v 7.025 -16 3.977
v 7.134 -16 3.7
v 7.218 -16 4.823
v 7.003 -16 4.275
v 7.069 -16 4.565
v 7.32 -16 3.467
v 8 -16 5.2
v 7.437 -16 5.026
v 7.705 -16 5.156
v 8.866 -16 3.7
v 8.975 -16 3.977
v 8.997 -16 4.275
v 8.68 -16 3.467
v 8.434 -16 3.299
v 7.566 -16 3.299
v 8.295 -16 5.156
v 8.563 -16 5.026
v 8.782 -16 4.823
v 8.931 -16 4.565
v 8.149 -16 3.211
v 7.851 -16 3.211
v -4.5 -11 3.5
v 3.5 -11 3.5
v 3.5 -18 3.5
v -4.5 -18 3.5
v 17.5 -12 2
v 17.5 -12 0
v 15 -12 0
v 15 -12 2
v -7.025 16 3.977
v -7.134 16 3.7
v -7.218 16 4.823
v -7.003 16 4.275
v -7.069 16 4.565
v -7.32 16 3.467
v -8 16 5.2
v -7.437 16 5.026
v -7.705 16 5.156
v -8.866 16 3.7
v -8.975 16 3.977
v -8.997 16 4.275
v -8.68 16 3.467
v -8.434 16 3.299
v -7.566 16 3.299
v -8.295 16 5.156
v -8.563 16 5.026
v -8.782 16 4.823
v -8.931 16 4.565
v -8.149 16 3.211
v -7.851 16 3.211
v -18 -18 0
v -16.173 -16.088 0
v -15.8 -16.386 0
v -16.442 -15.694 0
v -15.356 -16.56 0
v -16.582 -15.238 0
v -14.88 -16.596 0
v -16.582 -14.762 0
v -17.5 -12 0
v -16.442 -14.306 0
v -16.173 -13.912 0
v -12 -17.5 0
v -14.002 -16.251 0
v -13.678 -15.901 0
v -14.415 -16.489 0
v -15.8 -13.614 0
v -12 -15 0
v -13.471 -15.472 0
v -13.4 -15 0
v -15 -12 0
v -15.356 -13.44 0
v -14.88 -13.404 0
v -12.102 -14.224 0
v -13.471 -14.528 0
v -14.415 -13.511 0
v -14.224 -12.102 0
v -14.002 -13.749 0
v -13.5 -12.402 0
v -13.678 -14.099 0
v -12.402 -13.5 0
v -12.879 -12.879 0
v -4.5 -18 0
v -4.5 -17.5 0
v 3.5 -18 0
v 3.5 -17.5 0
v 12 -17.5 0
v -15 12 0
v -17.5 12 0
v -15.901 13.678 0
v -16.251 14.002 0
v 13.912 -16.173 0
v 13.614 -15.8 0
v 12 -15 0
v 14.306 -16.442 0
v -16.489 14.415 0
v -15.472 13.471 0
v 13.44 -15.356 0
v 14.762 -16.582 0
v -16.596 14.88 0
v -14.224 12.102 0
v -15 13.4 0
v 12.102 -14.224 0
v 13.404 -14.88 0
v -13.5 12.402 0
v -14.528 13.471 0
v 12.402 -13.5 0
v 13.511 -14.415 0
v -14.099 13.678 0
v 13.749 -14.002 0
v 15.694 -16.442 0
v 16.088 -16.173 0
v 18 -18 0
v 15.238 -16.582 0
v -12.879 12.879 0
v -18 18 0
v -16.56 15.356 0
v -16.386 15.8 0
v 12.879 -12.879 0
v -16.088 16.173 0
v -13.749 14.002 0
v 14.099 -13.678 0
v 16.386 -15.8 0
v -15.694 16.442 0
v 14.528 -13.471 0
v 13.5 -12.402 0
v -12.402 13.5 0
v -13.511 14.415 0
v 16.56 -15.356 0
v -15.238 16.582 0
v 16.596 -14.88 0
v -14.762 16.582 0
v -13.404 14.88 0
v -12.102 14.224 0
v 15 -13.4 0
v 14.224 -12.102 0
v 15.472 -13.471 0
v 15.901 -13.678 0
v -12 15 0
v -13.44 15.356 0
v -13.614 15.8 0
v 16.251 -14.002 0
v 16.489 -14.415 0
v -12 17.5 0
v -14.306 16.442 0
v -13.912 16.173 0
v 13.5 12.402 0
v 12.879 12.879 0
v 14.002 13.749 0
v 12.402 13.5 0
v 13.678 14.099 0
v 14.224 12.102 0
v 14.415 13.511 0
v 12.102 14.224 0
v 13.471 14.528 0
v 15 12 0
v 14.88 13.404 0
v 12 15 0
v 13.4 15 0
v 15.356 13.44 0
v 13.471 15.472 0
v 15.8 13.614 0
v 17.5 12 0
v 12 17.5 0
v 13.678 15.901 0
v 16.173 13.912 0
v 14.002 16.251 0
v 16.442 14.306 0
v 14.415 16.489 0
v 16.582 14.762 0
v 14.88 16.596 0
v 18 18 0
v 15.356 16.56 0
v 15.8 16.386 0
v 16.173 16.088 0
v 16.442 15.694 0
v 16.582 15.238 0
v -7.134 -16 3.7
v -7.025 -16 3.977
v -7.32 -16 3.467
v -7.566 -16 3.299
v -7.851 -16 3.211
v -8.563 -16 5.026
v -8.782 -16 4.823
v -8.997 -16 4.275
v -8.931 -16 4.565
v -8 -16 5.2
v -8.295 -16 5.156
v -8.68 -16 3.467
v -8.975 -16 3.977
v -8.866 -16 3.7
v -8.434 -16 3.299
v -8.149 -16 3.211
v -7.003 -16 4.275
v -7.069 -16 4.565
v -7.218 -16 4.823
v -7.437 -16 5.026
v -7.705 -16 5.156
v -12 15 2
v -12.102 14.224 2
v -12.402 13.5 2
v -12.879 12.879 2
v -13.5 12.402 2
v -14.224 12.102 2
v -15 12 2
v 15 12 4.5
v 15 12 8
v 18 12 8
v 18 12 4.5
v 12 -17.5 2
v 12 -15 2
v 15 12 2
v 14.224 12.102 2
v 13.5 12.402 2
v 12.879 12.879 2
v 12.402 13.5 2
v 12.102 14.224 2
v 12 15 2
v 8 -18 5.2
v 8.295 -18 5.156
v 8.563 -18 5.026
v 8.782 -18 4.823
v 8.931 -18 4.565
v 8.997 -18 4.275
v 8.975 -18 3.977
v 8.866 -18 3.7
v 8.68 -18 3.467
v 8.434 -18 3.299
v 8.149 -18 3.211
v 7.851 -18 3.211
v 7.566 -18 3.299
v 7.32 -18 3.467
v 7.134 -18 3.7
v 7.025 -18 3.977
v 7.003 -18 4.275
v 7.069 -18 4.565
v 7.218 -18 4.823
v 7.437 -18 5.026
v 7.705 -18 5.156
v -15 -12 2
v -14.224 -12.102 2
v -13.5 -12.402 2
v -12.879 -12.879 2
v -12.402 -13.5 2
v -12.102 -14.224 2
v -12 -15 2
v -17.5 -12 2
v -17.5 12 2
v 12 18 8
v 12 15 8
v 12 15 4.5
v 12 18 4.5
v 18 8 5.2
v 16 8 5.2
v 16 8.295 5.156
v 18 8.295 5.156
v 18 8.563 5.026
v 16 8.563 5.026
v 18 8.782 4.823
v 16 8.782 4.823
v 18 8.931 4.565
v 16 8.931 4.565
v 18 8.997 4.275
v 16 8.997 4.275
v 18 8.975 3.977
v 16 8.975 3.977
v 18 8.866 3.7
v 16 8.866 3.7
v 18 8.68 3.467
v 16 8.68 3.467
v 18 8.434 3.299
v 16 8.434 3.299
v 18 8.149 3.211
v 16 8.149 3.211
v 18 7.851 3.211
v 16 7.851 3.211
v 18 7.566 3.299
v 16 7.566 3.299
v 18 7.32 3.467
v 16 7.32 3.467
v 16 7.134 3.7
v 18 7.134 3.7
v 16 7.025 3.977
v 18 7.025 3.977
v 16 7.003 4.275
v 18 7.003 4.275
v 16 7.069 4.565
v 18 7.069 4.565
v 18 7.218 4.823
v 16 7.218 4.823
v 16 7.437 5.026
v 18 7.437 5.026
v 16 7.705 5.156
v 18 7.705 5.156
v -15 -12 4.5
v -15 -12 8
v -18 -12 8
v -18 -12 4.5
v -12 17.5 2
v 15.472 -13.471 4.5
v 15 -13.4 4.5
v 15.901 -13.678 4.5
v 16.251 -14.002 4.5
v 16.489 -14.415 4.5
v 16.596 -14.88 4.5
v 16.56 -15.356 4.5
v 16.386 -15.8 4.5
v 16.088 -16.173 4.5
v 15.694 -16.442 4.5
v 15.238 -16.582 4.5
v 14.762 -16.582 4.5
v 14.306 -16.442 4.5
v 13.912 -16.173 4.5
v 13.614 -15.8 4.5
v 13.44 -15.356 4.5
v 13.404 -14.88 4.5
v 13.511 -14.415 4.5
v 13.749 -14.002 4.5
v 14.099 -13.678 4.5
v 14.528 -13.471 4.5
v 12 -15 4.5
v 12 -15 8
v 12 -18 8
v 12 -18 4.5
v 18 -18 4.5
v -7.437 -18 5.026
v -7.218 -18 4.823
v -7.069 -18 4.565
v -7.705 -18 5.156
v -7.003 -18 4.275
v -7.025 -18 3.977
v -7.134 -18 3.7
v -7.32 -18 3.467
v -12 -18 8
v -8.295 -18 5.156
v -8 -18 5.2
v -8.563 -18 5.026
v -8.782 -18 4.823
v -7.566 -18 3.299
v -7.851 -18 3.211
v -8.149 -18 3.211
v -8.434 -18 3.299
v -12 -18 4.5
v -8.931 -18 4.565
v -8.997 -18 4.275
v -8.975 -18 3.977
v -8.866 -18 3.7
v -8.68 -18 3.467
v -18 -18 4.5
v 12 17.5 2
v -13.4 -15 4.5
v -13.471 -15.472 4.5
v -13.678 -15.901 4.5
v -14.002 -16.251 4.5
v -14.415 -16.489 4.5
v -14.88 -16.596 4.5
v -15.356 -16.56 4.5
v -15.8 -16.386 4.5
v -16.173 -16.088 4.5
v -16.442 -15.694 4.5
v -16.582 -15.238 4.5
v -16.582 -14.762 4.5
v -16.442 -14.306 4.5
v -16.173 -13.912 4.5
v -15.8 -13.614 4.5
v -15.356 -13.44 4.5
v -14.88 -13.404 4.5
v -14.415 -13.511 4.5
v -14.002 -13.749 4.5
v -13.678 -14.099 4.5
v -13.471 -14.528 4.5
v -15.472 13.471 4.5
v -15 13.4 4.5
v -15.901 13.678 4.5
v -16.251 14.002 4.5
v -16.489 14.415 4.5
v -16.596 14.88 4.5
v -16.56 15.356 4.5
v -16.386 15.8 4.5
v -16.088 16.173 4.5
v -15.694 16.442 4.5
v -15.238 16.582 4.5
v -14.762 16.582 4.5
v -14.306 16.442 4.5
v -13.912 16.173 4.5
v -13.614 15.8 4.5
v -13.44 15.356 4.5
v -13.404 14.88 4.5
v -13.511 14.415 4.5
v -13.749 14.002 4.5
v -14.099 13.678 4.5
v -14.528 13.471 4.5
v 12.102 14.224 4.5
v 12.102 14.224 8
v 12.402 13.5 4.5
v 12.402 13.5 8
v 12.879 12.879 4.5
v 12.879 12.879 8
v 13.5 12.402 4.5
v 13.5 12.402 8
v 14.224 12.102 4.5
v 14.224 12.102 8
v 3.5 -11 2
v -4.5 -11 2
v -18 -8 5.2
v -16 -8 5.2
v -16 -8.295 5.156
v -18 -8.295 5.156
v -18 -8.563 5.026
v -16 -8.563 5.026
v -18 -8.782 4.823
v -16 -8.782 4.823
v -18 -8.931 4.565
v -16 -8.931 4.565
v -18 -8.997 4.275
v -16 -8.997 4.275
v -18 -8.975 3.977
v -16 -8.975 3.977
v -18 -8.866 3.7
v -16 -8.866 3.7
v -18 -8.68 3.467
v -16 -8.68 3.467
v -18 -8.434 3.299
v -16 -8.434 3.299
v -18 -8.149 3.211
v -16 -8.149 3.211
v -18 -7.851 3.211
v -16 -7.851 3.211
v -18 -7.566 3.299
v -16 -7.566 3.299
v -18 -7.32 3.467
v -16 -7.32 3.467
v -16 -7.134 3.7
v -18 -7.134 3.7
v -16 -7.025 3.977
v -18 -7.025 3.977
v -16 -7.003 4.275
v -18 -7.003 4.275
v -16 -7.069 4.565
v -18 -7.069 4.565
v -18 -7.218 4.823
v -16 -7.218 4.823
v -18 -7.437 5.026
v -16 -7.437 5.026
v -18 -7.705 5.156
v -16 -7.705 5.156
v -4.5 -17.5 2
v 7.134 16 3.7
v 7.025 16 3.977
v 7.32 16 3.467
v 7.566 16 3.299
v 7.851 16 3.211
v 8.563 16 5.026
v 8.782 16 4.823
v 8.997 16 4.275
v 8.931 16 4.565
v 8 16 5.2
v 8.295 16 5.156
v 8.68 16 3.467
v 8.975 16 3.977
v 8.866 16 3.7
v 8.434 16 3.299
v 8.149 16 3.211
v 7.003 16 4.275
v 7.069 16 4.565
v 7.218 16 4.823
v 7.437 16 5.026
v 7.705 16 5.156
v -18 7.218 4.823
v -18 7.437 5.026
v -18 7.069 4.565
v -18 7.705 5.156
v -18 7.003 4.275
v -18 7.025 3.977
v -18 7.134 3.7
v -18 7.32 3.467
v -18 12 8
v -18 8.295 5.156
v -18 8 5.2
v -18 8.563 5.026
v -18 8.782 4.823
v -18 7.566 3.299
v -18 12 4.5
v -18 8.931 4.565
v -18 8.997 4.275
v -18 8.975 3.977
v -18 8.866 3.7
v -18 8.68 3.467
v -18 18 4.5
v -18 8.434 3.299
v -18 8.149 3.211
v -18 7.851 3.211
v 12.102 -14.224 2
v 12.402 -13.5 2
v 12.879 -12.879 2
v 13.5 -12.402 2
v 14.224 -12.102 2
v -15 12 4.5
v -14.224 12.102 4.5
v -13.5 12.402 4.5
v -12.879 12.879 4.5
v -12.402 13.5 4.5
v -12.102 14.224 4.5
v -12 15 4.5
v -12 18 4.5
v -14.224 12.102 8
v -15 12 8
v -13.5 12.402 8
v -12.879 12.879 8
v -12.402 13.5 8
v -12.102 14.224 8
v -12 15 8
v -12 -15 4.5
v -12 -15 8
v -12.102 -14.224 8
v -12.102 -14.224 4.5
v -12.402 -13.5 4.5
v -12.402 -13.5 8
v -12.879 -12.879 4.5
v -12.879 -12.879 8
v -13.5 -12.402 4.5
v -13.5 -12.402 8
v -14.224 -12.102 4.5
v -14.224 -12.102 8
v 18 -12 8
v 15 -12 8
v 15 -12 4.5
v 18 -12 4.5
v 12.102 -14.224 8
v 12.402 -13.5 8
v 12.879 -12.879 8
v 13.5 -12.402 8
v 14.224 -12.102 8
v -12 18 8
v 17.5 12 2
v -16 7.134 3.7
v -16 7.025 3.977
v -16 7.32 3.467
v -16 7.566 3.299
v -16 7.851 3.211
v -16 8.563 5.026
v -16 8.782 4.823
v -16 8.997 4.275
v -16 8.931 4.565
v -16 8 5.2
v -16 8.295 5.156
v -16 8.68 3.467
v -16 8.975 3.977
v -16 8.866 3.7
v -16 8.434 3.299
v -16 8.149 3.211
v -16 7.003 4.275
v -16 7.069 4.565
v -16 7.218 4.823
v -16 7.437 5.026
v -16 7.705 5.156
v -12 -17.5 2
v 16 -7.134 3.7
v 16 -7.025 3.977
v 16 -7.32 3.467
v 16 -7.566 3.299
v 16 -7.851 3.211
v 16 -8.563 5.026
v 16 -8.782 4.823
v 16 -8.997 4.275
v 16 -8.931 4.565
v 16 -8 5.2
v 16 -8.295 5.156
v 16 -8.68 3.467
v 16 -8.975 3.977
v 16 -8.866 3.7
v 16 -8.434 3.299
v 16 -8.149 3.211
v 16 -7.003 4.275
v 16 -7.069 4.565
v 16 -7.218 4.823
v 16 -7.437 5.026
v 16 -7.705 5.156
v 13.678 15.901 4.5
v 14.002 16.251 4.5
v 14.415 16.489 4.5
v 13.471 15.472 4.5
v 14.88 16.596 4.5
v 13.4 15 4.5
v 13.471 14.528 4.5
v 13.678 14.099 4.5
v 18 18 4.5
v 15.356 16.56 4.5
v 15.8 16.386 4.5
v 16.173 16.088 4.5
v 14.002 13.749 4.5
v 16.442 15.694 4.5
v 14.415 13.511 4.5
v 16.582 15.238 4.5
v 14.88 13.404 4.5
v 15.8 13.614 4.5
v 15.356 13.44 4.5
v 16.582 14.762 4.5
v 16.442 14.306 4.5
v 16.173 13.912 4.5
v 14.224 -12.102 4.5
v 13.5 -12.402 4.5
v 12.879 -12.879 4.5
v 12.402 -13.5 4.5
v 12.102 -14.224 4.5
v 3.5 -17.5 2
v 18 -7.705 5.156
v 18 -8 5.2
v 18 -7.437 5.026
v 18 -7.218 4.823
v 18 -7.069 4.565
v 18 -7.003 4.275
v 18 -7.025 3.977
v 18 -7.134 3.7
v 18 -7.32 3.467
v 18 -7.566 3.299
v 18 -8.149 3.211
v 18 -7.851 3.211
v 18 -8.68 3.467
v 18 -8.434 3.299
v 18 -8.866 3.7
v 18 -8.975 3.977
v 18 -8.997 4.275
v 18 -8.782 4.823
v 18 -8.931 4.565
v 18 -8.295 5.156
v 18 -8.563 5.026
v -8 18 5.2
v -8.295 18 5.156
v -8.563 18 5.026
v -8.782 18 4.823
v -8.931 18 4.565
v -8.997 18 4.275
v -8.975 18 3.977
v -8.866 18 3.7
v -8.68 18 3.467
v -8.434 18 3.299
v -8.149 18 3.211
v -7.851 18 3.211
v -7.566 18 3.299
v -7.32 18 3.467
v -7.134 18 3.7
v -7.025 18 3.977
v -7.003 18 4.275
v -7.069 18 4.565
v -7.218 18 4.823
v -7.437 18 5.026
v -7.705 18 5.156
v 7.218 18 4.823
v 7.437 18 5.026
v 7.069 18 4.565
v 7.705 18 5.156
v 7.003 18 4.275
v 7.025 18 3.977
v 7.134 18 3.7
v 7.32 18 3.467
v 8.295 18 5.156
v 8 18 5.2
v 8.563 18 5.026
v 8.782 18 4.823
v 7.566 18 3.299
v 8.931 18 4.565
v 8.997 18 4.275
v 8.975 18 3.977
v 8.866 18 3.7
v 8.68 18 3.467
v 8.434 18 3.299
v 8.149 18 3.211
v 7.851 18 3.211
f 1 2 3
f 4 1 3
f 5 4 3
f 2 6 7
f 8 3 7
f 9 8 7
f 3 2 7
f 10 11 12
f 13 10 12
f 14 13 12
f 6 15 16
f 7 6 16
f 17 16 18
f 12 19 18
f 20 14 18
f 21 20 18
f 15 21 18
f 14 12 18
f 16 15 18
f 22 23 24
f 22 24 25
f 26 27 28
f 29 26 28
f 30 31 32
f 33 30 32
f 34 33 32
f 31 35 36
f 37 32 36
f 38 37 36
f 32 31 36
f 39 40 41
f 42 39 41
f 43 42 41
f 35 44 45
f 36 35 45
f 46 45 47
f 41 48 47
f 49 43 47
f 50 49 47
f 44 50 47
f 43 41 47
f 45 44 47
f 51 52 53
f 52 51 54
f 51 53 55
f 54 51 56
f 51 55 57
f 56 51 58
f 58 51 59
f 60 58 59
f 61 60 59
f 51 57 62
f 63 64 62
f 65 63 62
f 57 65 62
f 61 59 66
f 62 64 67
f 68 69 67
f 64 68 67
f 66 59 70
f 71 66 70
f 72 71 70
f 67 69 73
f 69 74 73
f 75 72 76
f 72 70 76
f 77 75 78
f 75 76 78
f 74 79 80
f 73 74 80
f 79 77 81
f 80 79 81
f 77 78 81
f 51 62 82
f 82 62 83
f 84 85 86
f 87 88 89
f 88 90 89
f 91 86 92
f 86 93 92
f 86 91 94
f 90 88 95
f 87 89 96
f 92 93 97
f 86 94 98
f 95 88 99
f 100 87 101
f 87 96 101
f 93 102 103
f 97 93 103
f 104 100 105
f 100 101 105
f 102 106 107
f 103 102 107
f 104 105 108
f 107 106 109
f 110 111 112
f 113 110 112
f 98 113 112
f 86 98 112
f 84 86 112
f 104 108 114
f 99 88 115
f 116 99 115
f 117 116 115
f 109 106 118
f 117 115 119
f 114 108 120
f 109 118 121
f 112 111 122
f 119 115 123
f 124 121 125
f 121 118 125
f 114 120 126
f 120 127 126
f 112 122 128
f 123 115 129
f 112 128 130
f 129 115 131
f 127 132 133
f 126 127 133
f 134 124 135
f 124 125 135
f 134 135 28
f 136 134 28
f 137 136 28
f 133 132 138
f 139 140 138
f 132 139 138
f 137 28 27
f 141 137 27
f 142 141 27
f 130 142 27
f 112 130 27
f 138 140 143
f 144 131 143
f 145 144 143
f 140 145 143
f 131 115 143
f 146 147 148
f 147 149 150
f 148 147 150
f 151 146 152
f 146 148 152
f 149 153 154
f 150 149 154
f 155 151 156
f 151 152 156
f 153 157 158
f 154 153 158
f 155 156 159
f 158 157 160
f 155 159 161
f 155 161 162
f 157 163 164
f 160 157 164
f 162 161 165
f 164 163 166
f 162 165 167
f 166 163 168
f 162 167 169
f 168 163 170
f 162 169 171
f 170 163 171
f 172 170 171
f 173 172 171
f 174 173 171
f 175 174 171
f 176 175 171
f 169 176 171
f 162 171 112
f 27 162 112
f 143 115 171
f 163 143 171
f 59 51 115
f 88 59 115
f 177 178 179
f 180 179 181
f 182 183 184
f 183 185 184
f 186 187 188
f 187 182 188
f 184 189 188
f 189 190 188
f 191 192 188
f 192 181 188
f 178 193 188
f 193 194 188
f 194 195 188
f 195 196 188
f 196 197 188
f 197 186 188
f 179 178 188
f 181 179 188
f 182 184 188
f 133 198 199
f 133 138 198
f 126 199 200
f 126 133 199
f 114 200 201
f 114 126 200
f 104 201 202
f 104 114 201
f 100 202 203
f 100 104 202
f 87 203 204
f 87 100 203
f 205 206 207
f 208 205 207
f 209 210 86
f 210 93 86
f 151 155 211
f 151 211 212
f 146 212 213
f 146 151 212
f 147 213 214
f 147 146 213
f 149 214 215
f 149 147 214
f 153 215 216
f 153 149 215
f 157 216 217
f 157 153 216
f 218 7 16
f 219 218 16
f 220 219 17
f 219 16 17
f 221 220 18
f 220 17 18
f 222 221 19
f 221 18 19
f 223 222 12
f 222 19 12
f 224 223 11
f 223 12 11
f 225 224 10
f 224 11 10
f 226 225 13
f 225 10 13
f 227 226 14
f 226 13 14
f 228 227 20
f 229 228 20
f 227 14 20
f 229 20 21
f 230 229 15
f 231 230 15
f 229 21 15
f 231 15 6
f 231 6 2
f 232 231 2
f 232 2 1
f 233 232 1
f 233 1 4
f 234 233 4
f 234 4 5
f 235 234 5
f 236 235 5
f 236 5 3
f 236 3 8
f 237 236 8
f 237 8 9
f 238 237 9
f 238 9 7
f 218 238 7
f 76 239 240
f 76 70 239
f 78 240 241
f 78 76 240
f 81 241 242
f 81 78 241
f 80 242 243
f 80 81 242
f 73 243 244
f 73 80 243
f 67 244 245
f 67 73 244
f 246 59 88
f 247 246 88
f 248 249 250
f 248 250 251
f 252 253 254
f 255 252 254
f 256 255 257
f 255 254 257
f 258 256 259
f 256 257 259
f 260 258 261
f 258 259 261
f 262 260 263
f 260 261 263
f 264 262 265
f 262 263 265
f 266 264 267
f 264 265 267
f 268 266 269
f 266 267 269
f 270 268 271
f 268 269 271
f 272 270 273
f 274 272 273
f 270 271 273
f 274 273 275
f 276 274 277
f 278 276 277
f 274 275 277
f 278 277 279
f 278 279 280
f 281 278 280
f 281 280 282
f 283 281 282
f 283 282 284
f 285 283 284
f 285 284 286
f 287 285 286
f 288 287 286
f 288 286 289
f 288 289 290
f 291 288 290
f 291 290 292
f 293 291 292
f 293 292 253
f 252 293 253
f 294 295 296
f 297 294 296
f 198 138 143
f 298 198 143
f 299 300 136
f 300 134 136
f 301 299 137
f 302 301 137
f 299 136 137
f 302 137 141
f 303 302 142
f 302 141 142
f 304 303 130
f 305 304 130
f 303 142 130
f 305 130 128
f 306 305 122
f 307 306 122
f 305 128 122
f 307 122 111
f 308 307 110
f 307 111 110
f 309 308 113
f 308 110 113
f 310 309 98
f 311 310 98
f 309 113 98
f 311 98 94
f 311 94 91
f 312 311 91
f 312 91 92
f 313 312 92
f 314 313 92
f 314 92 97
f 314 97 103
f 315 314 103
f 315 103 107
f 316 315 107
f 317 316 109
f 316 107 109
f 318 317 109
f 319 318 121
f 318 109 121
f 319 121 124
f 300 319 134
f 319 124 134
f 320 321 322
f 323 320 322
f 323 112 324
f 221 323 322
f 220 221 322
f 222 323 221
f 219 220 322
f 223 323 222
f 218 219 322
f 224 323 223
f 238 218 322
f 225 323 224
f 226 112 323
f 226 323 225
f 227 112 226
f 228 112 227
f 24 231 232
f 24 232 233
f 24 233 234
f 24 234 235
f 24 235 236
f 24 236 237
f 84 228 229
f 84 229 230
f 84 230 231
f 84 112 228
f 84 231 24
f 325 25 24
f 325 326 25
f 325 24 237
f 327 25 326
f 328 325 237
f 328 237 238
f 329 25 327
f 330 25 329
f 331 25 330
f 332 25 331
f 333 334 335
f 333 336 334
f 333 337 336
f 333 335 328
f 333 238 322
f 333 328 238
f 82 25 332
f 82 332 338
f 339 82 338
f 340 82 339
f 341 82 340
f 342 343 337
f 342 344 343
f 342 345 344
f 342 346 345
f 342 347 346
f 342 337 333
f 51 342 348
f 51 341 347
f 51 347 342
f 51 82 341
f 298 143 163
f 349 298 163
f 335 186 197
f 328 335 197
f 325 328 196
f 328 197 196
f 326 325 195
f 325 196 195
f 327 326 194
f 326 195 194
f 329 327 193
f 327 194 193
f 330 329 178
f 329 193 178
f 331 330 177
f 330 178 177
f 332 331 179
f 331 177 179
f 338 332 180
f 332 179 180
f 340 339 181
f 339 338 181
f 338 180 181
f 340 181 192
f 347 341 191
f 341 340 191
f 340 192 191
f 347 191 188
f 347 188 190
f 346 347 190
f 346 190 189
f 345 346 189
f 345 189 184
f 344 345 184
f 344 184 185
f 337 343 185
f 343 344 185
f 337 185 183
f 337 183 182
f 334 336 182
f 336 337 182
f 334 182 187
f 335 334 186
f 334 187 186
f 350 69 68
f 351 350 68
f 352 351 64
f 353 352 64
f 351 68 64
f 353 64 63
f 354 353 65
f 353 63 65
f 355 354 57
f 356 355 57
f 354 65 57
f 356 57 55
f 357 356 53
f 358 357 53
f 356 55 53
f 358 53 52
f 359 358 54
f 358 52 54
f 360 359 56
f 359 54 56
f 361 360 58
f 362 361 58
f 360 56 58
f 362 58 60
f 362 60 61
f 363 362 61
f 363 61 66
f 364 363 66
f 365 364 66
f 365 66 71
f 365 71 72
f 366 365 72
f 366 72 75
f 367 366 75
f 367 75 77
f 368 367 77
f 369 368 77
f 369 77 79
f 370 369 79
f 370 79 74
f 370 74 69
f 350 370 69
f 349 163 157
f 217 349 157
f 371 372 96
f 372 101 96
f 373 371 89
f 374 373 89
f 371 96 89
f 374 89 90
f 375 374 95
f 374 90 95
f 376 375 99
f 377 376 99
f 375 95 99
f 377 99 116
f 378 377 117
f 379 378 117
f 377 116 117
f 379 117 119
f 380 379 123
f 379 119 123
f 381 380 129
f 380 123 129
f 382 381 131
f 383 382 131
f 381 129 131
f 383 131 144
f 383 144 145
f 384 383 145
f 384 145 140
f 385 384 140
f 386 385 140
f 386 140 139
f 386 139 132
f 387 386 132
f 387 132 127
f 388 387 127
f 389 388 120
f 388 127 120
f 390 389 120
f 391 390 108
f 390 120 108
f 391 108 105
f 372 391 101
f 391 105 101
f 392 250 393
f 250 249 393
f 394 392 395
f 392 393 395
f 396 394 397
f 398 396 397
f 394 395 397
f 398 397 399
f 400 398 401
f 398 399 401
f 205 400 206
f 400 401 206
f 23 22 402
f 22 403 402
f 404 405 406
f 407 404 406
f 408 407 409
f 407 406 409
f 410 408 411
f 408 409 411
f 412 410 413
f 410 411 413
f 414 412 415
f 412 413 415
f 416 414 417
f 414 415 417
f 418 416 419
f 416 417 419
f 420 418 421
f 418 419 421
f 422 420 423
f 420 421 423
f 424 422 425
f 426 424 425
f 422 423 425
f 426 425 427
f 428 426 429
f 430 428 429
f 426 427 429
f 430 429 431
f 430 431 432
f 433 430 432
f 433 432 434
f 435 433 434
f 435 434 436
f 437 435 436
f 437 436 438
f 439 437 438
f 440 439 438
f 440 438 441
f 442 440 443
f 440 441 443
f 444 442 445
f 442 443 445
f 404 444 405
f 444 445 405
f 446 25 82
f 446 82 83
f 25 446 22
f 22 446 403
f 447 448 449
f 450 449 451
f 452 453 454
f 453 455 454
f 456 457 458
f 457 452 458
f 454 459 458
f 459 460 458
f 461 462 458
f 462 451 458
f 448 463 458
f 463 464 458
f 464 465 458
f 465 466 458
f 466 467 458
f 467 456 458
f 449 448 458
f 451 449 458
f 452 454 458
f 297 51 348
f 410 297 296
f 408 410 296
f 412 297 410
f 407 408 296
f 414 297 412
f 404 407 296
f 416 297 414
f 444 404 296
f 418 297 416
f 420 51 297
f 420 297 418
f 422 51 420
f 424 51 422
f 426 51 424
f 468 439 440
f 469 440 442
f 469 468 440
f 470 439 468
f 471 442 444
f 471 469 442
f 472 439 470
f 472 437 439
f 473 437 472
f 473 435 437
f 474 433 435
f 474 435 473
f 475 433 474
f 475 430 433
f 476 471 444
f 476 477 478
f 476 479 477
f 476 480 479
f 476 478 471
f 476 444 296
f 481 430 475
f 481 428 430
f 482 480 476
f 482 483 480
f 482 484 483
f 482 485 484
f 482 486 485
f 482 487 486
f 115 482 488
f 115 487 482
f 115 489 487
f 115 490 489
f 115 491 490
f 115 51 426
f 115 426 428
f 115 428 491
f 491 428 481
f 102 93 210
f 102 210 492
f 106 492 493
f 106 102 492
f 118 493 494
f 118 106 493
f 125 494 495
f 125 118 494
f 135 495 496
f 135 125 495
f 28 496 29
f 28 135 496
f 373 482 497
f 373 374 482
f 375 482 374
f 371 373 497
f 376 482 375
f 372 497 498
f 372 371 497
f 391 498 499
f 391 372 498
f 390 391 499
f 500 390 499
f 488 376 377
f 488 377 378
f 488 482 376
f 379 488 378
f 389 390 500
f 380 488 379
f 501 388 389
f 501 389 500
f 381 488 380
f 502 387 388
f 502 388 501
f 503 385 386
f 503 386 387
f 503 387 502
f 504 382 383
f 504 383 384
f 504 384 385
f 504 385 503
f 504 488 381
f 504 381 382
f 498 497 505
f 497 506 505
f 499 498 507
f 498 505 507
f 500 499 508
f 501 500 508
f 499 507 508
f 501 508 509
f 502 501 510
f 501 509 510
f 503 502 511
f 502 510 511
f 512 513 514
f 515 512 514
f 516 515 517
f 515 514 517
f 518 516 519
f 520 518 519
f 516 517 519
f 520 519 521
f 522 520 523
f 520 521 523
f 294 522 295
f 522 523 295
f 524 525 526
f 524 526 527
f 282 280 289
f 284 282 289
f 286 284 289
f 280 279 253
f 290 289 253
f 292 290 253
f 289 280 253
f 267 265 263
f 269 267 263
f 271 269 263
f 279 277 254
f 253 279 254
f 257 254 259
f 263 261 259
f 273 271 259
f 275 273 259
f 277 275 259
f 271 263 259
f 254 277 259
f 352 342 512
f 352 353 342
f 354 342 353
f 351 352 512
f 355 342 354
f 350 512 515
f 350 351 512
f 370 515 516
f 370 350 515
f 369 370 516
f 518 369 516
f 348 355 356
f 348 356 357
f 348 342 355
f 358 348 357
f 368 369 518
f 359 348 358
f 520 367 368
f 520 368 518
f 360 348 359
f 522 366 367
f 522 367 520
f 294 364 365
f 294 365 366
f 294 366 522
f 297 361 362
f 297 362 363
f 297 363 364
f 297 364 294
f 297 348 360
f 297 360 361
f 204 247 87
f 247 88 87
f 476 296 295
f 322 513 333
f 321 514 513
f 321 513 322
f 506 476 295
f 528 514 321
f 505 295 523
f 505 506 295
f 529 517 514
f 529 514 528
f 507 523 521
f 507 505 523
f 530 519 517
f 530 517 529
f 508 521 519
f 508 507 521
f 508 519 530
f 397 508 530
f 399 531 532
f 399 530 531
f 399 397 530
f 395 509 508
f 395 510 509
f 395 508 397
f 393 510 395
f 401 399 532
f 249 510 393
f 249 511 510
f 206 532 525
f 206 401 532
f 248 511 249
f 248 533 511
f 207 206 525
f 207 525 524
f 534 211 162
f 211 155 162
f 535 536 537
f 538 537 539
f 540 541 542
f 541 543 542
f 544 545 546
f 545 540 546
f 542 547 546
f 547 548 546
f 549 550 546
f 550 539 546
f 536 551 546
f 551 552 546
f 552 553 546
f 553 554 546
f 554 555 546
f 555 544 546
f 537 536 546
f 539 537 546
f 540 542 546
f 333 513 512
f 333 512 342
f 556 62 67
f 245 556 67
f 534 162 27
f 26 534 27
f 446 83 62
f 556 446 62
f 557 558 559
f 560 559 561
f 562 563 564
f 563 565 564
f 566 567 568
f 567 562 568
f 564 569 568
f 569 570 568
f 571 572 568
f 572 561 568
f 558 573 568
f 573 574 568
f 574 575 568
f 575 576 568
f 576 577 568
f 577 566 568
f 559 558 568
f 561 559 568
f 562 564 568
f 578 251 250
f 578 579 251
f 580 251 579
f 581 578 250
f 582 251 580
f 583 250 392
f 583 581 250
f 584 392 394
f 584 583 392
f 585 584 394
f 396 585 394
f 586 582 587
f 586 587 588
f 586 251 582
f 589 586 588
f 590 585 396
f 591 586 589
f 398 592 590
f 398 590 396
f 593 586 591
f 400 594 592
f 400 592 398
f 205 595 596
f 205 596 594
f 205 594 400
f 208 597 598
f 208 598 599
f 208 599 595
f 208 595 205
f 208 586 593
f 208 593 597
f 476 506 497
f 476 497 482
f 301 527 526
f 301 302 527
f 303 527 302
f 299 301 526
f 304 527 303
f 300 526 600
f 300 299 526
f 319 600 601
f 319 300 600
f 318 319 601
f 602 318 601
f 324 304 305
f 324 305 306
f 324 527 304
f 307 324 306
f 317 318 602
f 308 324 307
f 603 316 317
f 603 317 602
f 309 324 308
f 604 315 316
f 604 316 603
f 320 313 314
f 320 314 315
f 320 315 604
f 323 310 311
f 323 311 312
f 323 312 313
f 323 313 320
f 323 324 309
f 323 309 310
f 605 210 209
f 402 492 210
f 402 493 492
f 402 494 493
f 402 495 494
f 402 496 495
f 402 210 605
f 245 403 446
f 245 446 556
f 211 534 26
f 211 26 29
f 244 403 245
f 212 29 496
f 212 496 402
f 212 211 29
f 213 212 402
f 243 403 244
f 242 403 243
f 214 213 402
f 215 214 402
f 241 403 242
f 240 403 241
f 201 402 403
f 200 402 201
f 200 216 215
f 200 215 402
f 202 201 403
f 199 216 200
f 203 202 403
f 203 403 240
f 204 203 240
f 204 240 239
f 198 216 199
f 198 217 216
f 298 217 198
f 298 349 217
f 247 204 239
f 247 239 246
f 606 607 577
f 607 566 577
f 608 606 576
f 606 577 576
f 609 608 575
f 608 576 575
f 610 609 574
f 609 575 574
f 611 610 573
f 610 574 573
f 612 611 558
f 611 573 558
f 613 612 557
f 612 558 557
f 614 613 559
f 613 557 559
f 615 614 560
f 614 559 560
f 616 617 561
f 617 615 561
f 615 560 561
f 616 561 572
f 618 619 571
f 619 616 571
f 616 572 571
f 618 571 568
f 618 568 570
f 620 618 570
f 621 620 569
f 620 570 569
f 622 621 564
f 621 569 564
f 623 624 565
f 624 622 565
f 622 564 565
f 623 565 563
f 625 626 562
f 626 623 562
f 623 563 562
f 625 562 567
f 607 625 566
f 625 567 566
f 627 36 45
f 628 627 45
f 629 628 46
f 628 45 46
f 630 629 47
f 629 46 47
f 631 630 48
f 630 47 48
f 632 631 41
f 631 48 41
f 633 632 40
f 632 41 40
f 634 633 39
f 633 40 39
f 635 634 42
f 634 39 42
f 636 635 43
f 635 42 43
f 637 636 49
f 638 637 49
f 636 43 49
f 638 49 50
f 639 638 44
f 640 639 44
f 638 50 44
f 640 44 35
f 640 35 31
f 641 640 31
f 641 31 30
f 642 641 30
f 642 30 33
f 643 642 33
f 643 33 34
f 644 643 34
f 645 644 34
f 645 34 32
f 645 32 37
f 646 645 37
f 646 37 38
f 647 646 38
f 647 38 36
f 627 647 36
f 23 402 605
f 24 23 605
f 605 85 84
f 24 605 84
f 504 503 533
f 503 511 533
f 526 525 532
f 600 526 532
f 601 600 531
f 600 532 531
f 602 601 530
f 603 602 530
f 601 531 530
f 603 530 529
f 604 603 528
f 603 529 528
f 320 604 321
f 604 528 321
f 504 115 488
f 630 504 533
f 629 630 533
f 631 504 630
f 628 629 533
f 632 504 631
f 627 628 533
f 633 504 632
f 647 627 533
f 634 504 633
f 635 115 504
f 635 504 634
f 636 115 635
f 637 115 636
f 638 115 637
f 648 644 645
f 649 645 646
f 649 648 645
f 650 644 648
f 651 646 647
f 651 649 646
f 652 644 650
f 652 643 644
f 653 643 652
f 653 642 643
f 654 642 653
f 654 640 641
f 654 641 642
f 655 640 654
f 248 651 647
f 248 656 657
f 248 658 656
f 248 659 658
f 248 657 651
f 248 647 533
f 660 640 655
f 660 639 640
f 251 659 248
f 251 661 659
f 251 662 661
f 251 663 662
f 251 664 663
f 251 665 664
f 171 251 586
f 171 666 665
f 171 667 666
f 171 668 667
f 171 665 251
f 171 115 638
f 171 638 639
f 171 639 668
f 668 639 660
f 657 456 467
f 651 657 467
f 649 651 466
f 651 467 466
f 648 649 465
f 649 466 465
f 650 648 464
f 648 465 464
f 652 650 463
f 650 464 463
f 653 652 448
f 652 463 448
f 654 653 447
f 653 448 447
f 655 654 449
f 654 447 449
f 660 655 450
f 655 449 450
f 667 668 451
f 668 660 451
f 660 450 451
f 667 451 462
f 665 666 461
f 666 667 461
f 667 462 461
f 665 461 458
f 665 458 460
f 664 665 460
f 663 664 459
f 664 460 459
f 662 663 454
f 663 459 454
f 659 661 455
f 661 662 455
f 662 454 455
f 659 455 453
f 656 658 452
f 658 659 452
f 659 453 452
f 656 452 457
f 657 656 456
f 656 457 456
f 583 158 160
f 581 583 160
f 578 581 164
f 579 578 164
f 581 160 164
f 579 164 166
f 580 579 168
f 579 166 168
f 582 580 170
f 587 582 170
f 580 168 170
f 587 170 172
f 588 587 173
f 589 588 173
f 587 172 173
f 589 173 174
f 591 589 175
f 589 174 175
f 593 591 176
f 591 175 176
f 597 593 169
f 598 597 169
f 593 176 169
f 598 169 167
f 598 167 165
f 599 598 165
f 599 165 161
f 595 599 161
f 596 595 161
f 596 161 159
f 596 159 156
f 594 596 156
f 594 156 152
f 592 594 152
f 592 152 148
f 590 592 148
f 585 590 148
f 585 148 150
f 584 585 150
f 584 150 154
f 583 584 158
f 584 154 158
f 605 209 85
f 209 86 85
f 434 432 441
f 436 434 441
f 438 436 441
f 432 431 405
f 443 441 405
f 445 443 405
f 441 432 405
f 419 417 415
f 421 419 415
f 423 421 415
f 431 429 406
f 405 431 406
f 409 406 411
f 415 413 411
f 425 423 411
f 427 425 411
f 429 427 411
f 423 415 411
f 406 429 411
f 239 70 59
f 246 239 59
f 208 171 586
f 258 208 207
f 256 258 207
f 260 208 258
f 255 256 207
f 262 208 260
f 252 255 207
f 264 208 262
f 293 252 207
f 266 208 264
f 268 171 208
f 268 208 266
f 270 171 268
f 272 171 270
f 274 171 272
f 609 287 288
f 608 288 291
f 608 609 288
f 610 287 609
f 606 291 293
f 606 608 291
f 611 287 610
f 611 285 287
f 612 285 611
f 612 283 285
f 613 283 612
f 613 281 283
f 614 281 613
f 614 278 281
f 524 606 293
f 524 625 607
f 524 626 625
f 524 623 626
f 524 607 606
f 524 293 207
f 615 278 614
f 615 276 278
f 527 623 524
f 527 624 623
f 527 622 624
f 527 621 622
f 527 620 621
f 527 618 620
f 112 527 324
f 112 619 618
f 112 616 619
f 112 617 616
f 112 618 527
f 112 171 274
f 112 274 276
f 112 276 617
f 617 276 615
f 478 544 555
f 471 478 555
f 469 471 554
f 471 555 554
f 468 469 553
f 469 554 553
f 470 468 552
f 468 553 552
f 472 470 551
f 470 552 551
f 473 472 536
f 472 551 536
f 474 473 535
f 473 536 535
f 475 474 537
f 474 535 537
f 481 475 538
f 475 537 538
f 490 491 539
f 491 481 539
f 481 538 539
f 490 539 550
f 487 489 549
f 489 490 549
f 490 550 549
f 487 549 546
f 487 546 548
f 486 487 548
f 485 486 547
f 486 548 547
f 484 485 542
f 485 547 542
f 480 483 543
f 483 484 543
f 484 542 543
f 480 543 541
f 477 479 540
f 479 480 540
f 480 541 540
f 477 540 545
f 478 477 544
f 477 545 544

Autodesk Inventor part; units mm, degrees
ref_plane "YZ Plane" through (0, 0, 0) normal (1, 0, 0) x (0, 1, 0)
ref_plane "XZ Plane" through (0, 0, 0) normal (0, 1, 0) x (-1, 0, 0)
sketch "Sketch1" plane through (0, 0, 0) normal (0, 0, 1) x (1, 0, 0)
  line L0 (-21.6, 0) -> (3.6, 0) construction
  line L1 (0, -3.6) -> (0, 21.6) construction
  line L2 (-18, 18) -> (0, 18)
  line L3 (0, 18) -> (0, 0)
  line L4 (0, 0) -> (-18, 0)
  line L5 (-18, 0) -> (-18, 18)
  dimension "d0" = 18
  dimension "d1" = 18
extrude "Extrusion1" add sketch "Sketch1" along normal blind 8
sketch "Sketch2" plane through (0, 0, 8) normal (0, 0, 1) x (1, 0, 0)
  line L0 (-21.6, 0) -> (3.6, 0) projected
  line L1 (0, -3.6) -> (0, 21.6) projected
  point P0 (0, 0)
  point P1 (-15, 15)
  dimension "d4" = 15
  dimension "d5" = 15
hole "Hole1" at (-15, 15, 8) direction (0, 0, -1) diameter 3.2 end through all
sketch "Sketch3" plane through (0, 0, 8) normal (0, 0, 1) x (1, 0, 0)
  line L0 (-21.6, 0) -> (3.6, 0) construction
  line L1 (0, -3.6) -> (0, 21.6) construction
  line L2 (-18, 18) -> (-18, 0) construction
  line L3 (0, 18) -> (-18, 18) construction
  circle A0 centre (-15, 15) radius 1.6 construction
  arc A1 (-15, 12) -> (-12, 15) centre (-15, 15) ccw
  line L4 (-15, 12) -> (-18, 12)
  line L5 (-12, 15) -> (-12, 18)
  line L6 (-12, 18) -> (-18, 18)
  line L7 (-18, 12) -> (-18, 18)
  point P0 (0, 0)
  dimension "d13" = 3
extrude "Extrusion2" cut sketch "Sketch3" against normal blind 3.5
sketch "Sketch4" plane through (0, 0, 0) normal (0, 0, -1) x (-1, 0, 0)
  line L0 (21.6, 0) -> (-3.6, 0) construction
  line L1 (0, -3.6) -> (0, 21.6) construction
  line L2 (18, 18) -> (18, 0) construction
  line L3 (0, 18) -> (18, 18) construction
  line L4 (17.5, 0) -> (17.5, 12)
  circle A0 centre (15, 15) radius 1.6 construction
  line L5 (17.5, 12) -> (15, 12)
  arc A1 (12, 15) -> (15, 12) centre (15, 15) ccw
  line L6 (12, 15) -> (12, 17.5)
  line L7 (12, 17.5) -> (0, 17.5)
  line L8 (0, 17.5) -> (0, 0)
  line L9 (0, 0) -> (17.5, 0)
  dimension "d19" = 0.5
  dimension "d20" = 0.5
  dimension "d21" = 3
extrude "Extrusion3" cut sketch "Sketch4" against normal blind 2
sketch "Sketch5" plane through (-18, 18, 0) normal (0, 1, 0) x (1, 0, 0)
  line L0 (-3.6, 0) -> (21.6, 0) projected
  line L1 (18, 1.6) -> (18, -9.6) projected
  line L2 (18, -8) -> (6, -8) projected
  point P0 (18, 0)
  point P1 (10, -4.2)
  dimension "d24" = 8
  dimension "d25" = 3.8
hole "M3/6/10" at (-8, 18, 4.2) direction (0, -1, 0) diameter 2 depth 2
ref_plane "Work Plane1" through (-18, 18, 0) normal (0.7071, 0.7071, 0) x (0, 0, 1)
mirror "Mirror1" about plane through (-18, 18, 0) normal (0.7071, 0.7071, 0) of "M3/6/10"
pattern_circular "Circular Pattern1" count 4 over 360 about axis through (0, 0, -10) along (0, 0, 1)
sketch "Sketch7" plane through (0, 0, 0) normal (0, 0, -1) x (-1, 0, 0)
  line L0 (25.2, 0) -> (-25.2, 0) construction
  line L1 (0, -27.6) -> (0, 25.6) construction
  line L2 (18, -18) -> (-18, -18) construction
  line L3 (4.5, -11) -> (-3.5, -11)
  line L4 (-3.5, -11) -> (-3.5, -20)
  line L5 (-3.5, -20) -> (4.5, -20)
  line L6 (4.5, -20) -> (4.5, -11)
  line L7 (0.5, -11) -> (0.5, -20) construction
  line L8 (-18, -18) -> (-18, 18) projected
  point P0 (0, 0)
  dimension "d33" = 9
  dimension "d34" = 8
  dimension "d35" = 2
  dimension "d36" = 18.5
extrude "Extrusion4" cut sketch "Sketch7" against normal blind 3.5
equation "\"d5\" = d4"
equation "\"d20\" = d19"
properties part number "P106" material "ABS Plastic"
